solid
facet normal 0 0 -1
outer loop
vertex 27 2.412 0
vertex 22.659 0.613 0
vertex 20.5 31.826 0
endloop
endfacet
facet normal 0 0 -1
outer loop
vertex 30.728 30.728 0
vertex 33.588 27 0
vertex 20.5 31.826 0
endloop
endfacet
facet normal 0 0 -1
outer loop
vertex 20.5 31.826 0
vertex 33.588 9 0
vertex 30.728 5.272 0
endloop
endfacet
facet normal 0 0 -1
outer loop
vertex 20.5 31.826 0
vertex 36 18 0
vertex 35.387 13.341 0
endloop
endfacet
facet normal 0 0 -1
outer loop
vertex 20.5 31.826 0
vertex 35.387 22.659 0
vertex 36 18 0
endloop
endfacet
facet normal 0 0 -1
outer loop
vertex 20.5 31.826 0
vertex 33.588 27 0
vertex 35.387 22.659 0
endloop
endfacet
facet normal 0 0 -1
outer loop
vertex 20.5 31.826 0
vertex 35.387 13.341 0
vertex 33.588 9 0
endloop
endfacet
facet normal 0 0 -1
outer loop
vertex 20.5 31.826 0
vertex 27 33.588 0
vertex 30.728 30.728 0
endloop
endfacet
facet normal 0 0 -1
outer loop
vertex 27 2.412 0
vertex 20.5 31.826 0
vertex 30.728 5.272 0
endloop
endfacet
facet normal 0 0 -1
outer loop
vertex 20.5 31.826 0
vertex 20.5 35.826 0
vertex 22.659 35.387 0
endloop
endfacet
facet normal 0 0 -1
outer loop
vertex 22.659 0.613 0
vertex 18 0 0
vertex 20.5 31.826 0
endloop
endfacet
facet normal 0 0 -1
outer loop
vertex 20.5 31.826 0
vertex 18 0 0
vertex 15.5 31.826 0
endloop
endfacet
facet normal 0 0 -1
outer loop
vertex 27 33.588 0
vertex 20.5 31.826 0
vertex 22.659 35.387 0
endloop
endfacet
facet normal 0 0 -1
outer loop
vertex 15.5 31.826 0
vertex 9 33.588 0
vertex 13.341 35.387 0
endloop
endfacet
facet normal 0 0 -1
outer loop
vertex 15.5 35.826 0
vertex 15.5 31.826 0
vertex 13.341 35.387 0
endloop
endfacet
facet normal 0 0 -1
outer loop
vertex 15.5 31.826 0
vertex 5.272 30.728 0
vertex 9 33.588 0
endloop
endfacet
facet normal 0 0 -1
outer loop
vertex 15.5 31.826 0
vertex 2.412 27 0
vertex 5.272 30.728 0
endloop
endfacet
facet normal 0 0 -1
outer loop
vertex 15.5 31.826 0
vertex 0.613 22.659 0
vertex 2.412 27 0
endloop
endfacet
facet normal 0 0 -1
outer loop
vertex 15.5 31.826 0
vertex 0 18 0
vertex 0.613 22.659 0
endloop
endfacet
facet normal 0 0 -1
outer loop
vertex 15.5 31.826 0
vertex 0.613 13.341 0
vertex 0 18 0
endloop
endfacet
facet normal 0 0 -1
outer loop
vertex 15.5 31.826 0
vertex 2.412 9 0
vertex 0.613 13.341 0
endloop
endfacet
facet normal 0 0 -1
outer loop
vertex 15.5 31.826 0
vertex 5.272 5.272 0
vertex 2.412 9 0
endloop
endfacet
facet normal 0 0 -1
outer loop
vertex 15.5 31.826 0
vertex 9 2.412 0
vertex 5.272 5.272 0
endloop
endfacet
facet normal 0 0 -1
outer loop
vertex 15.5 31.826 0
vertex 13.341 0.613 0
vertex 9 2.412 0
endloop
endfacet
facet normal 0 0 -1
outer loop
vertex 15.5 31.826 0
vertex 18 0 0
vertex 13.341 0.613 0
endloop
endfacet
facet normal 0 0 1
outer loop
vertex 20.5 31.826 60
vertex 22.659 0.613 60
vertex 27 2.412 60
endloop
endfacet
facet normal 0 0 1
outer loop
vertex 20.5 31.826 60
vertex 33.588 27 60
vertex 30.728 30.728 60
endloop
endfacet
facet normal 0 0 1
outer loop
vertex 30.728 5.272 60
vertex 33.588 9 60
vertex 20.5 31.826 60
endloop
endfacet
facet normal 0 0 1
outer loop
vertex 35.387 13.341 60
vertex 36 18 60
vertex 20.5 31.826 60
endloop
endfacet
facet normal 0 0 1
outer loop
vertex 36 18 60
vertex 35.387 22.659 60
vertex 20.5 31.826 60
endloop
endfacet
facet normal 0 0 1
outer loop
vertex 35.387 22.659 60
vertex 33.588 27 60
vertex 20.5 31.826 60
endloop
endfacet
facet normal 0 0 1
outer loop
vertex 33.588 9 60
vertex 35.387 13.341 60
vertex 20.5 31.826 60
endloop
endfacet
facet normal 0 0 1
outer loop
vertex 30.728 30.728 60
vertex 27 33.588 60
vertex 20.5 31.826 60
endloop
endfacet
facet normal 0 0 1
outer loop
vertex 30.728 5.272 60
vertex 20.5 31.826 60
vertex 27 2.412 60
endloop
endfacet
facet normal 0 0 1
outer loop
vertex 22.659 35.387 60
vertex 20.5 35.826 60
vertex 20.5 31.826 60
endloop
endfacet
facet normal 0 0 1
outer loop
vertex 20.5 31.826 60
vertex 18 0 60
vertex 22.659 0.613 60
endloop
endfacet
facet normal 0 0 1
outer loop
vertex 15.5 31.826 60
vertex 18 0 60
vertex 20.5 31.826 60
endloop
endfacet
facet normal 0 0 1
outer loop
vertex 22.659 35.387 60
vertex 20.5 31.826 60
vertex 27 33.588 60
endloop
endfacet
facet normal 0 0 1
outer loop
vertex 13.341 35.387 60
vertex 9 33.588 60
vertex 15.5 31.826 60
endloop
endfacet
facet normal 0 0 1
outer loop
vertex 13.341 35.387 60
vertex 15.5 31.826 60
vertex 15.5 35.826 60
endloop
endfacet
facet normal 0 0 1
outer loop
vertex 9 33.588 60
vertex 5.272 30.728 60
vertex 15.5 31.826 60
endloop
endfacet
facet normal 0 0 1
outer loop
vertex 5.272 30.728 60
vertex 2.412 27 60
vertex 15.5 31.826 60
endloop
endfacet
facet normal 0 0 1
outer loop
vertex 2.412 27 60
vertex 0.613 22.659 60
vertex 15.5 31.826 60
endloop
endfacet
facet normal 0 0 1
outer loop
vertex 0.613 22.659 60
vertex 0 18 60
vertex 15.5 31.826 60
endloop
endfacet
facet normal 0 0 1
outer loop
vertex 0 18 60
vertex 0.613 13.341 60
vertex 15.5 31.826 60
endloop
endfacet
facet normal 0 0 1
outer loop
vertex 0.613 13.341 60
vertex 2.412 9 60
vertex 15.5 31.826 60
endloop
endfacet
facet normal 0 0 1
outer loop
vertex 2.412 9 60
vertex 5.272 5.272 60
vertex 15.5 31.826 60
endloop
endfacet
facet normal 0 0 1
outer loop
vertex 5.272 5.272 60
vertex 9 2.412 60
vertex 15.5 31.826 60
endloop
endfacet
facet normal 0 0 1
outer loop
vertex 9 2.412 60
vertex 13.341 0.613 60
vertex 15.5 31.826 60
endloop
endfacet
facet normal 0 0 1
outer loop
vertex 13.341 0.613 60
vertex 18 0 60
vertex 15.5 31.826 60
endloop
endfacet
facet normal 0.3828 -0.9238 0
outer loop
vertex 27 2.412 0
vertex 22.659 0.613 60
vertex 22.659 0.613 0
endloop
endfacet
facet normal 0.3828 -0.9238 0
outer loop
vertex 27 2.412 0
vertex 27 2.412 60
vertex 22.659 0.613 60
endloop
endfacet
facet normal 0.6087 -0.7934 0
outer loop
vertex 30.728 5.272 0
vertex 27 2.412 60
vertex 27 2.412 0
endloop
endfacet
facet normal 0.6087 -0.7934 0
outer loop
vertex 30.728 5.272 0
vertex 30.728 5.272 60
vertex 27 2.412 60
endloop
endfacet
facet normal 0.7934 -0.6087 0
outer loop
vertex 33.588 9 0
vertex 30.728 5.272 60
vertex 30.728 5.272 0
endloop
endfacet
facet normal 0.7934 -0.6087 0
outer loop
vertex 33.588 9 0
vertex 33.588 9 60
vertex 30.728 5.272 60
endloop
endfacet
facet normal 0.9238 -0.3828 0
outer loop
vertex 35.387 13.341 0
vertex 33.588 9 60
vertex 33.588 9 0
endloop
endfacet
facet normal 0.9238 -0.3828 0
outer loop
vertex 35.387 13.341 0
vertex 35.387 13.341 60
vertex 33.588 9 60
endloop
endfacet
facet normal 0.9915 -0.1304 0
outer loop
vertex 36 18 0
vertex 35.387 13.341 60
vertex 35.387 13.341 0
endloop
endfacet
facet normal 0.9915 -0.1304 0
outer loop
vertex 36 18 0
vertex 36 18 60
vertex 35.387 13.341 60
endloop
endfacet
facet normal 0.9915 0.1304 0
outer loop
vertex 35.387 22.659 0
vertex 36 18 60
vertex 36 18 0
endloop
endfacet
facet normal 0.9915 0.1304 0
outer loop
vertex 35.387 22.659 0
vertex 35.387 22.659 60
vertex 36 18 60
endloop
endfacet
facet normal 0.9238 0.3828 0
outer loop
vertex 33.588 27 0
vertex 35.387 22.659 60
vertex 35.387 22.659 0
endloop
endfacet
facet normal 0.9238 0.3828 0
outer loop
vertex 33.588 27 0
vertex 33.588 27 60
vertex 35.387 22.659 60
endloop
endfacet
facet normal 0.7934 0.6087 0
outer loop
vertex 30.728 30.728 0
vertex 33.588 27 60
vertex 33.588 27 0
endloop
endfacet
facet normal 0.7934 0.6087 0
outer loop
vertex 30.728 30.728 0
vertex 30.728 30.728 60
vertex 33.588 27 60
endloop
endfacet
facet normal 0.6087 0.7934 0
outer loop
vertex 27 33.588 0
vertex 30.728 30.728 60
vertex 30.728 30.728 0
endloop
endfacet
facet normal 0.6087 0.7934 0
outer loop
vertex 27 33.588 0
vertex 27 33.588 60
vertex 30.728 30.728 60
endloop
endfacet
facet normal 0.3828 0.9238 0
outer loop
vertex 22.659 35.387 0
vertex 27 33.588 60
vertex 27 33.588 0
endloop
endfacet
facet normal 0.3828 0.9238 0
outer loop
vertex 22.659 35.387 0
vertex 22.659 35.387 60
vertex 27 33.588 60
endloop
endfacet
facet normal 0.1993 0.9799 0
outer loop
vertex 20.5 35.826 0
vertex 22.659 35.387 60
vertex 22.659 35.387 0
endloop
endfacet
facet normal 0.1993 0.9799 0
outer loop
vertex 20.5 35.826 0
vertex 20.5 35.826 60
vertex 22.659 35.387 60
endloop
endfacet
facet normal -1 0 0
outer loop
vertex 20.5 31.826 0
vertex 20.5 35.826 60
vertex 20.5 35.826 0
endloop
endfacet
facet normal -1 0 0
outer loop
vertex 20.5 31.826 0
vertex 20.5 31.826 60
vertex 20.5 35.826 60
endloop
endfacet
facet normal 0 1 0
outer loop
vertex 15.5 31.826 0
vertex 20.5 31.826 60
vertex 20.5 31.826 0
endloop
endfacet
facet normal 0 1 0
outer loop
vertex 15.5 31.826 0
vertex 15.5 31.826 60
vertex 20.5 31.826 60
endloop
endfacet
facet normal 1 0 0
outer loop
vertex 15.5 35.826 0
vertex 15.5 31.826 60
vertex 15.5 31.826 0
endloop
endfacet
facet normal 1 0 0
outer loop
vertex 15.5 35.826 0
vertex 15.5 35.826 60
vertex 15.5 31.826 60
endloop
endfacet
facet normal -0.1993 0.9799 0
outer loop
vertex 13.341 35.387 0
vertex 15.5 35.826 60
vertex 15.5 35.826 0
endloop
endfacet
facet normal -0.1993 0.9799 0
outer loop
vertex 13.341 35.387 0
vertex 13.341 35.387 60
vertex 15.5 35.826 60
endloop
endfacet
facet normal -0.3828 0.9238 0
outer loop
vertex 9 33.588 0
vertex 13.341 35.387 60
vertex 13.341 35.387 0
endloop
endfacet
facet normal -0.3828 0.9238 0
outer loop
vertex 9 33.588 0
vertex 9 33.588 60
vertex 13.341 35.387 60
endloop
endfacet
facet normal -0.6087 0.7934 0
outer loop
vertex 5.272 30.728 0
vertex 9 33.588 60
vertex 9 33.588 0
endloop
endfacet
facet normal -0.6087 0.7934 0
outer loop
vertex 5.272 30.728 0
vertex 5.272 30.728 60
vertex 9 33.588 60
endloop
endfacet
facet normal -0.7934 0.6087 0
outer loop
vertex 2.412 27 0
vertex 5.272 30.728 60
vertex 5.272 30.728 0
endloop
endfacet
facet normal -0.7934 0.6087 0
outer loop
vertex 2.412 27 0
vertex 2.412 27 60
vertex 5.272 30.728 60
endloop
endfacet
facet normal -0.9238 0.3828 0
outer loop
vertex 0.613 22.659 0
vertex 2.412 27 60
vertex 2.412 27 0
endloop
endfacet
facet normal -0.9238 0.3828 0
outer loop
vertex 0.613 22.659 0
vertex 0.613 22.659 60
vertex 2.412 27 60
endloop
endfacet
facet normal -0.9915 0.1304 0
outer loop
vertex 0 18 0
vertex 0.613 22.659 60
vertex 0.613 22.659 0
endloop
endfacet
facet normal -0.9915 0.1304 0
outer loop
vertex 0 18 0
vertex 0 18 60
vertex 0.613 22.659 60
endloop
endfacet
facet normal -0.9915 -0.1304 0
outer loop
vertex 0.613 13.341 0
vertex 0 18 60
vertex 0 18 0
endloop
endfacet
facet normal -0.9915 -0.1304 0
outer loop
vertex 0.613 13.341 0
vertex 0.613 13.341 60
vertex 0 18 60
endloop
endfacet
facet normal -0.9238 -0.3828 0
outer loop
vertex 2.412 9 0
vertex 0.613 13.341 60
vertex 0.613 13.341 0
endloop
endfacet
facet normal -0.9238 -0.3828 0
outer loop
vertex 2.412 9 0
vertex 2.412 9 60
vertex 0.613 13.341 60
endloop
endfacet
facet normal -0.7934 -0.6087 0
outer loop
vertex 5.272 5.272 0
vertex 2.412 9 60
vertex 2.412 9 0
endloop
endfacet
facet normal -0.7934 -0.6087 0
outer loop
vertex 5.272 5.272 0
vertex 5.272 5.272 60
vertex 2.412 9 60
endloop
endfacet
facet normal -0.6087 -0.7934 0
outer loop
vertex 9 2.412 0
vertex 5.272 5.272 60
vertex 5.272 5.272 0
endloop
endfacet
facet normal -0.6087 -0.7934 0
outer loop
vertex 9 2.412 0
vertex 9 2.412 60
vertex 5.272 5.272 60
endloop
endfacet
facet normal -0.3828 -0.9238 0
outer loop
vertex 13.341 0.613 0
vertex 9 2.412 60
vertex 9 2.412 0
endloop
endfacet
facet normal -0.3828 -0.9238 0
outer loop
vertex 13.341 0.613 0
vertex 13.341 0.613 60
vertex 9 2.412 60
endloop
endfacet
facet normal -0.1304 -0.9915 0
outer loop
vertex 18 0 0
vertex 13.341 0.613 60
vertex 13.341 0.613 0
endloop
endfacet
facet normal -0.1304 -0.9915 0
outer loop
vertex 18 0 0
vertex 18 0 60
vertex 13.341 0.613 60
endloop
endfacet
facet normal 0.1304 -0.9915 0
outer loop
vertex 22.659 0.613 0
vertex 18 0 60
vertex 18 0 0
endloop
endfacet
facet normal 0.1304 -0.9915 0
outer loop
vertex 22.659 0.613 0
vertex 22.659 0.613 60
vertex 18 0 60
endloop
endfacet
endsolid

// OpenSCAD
$fn = 32;

// ----------------------------------------------------------------------
// Keyway shaft: d36 shaft, key 5 x 4 mm
// ----------------------------------------------------------------------

// --- parameters (mm) ---
shaft_r = 18;             // shaft radius
key_w = 5;                // keyway width
key_d = 4;                // keyway depth below the surface line
plate_t = 60;             // shaft length, Z (extrusion height)

shaft_d = 2 * shaft_r;  // shaft diameter
circle_step = 15;  // polygon sampling step, degrees

profile = [[13.341, 35.387], [9, 33.588], [5.272, 30.728], [2.412, 27], [0.613, 22.659], [0, 18], [0.613, 13.341], [2.412, 9], [5.272, 5.272], [9, 2.412], [13.341, 0.613], [18, 0], [22.659, 0.613], [27, 2.412], [30.728, 5.272], [33.588, 9], [35.387, 13.341], [36, 18], [35.387, 22.659], [33.588, 27], [30.728, 30.728], [27, 33.588], [22.659, 35.387], [20.5, 35.826], [20.5, 31.826], [15.5, 31.826], [15.5, 35.826]];  // primary outline, 27 points, counter clockwise

// --- the one profile operation ---
linear_extrude(height = plate_t) polygon(points = profile);
